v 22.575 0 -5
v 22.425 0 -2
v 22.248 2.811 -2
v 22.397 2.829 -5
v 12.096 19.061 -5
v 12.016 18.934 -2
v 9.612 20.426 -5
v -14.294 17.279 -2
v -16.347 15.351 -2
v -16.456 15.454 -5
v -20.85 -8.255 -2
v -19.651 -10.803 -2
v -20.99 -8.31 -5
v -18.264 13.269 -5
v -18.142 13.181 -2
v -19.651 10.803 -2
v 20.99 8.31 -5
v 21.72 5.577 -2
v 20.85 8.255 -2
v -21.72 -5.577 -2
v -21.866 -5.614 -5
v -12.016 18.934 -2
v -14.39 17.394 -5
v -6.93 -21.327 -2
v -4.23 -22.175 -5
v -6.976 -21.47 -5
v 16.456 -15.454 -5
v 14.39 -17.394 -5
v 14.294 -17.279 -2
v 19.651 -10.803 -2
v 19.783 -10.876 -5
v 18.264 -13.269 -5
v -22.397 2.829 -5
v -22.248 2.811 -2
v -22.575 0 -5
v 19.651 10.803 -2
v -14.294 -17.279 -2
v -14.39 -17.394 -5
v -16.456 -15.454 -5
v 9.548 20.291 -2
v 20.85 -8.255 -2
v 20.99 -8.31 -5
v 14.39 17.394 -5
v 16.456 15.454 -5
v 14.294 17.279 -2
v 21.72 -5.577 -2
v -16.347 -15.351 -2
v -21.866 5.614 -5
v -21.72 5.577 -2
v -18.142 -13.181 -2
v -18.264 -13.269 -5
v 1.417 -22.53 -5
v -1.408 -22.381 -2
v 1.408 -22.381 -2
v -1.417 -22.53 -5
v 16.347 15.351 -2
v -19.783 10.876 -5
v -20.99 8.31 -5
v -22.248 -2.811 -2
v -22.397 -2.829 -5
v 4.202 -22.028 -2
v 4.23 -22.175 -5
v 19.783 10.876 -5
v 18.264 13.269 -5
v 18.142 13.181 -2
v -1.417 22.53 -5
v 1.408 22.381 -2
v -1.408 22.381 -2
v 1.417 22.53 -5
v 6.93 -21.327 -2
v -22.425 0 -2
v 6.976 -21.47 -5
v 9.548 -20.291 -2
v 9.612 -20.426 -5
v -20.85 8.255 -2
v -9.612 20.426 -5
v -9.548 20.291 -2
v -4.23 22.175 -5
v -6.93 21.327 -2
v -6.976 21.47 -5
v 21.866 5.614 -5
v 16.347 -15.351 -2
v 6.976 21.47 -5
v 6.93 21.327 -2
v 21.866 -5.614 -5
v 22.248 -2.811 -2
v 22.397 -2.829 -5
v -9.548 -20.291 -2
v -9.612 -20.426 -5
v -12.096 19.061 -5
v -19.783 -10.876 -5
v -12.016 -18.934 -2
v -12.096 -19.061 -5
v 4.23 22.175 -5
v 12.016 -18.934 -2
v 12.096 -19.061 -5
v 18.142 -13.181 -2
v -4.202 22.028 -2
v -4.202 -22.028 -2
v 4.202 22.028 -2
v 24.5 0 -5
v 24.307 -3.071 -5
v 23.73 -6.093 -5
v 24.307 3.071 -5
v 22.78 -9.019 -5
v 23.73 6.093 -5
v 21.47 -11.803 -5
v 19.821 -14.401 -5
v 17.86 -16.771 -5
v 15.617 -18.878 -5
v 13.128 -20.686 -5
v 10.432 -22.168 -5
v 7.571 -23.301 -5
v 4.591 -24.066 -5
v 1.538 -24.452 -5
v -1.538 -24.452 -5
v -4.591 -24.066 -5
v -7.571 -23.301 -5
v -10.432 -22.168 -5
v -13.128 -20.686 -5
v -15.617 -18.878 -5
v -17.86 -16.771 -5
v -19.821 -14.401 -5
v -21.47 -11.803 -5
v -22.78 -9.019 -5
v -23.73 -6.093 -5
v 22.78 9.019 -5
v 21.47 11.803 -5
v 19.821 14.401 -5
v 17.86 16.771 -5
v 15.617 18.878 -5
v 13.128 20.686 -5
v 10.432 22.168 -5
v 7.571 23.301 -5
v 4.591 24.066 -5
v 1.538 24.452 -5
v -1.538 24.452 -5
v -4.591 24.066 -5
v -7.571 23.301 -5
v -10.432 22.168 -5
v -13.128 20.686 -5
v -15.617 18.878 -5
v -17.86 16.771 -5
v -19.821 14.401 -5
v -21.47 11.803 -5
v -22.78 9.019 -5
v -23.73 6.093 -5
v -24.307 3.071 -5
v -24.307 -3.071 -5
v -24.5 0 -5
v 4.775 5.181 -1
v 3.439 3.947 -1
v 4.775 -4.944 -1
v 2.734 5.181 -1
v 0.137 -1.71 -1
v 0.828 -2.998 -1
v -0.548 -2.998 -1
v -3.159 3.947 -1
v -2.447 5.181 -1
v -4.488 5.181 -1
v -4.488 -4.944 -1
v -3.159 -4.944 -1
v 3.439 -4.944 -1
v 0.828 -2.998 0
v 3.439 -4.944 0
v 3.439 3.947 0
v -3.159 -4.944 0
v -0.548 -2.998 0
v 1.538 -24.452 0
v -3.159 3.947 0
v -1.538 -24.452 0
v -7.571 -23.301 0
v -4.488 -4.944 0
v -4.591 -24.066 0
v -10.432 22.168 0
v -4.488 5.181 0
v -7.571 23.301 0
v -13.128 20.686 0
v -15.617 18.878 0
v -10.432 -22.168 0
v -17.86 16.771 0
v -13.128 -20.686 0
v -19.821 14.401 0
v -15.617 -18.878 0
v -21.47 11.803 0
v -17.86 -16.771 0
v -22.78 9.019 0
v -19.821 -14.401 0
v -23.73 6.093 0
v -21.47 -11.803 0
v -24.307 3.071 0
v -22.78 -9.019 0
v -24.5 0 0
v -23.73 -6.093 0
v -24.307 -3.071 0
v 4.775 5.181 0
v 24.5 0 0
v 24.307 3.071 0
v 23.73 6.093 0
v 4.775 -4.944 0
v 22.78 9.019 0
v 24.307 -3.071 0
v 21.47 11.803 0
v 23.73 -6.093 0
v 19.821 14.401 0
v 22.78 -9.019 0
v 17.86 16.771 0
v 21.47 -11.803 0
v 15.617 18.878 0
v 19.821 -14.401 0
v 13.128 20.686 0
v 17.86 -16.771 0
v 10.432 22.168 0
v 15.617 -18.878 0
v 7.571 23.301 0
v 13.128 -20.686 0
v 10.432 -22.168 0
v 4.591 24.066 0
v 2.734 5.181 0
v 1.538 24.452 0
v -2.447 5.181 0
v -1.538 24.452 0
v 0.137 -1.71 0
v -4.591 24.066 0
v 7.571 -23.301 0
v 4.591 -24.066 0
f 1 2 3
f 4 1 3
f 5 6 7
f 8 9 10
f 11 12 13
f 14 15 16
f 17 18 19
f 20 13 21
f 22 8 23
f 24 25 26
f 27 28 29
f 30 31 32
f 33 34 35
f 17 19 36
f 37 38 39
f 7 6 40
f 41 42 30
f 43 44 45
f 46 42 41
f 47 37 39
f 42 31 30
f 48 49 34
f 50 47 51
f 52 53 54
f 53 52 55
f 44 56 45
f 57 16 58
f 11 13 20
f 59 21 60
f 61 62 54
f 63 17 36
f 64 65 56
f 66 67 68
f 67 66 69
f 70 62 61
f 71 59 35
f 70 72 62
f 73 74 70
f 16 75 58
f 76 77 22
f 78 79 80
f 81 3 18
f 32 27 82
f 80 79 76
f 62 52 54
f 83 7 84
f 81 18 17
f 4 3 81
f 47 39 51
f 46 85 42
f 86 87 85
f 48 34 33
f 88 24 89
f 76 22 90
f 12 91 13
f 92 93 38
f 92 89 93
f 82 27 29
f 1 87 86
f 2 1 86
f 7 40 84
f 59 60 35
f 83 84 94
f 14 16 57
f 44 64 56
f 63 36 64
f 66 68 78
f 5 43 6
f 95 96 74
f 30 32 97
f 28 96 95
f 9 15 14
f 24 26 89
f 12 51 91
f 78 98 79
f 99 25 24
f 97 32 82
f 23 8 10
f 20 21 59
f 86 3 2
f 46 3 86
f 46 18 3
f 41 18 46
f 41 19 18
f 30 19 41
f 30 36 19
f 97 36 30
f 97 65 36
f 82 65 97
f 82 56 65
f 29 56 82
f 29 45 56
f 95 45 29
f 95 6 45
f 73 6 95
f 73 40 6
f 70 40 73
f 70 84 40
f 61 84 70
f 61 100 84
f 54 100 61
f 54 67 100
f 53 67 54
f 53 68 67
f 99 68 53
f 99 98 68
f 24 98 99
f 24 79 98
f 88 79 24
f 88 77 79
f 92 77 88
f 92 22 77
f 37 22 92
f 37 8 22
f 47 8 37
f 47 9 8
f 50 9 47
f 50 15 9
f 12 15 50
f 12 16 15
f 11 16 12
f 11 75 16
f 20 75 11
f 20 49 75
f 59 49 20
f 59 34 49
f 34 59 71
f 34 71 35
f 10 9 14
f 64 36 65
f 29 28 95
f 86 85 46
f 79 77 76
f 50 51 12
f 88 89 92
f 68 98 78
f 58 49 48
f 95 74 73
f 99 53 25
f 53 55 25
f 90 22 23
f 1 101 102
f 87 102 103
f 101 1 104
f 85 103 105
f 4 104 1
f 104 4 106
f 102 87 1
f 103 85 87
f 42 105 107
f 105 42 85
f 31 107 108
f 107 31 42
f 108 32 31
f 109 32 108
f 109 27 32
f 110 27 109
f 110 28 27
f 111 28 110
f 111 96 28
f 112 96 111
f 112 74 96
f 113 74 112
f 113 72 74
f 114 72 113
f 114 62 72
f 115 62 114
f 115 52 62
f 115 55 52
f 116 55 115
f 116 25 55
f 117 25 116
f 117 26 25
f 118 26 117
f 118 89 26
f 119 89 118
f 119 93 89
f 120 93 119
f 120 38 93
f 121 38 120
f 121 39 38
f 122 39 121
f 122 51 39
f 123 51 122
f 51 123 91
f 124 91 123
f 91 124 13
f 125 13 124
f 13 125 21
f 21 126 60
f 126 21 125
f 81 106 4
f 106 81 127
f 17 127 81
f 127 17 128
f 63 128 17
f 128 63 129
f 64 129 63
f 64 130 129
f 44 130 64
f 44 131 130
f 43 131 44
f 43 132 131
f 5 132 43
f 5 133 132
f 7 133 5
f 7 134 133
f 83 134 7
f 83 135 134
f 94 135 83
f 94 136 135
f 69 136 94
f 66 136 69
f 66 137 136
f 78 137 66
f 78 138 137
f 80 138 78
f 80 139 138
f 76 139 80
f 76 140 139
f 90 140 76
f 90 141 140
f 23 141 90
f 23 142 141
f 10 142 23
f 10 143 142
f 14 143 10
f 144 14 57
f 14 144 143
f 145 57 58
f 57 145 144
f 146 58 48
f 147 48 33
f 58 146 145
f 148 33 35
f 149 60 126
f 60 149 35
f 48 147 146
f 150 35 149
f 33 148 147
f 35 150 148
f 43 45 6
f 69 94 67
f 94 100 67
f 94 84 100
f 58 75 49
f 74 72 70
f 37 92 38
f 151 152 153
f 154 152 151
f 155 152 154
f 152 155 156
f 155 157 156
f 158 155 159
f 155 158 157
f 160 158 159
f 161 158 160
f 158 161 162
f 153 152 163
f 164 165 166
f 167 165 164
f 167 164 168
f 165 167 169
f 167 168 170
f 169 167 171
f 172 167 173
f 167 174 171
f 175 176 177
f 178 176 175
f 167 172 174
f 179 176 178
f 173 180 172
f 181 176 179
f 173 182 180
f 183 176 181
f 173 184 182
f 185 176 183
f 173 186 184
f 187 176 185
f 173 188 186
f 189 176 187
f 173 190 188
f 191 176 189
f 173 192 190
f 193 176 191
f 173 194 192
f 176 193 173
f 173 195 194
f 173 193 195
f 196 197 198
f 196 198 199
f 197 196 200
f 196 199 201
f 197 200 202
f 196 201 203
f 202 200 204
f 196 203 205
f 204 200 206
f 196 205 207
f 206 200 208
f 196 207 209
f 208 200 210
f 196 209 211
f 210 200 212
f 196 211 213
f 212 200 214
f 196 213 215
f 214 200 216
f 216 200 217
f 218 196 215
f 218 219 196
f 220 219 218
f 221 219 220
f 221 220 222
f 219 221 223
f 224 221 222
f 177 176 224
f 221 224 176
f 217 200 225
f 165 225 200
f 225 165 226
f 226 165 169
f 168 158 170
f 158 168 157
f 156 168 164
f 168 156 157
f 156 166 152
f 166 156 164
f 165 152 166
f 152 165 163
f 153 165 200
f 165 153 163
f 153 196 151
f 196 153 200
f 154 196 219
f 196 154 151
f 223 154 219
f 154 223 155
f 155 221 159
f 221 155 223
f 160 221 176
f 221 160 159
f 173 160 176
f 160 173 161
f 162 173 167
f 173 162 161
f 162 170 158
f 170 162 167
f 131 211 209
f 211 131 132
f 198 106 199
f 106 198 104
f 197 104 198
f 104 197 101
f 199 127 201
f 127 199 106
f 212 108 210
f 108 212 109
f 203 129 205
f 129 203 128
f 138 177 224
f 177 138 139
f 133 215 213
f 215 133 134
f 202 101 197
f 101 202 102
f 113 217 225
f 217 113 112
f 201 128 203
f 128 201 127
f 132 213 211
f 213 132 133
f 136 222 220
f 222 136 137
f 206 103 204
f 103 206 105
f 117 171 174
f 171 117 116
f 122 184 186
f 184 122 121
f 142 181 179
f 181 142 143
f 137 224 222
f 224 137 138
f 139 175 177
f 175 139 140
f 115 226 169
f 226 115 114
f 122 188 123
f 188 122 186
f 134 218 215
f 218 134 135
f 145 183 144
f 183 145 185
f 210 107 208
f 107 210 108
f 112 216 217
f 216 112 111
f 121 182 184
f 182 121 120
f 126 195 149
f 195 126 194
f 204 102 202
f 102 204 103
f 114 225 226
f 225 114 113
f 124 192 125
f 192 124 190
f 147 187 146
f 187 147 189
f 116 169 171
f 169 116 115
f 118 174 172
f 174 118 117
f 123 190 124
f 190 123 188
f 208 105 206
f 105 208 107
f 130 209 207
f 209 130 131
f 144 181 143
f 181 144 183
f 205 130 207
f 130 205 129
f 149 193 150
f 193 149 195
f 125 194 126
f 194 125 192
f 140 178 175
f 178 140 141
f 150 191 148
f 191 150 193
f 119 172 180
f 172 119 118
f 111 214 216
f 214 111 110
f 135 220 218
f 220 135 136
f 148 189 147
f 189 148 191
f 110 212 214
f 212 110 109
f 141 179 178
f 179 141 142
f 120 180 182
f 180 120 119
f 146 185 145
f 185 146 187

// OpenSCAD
$fn = 50;


difference() {
	union() {
		translate(v = [0, 0, -5.0000000000]) {
			cylinder(h = 5, r = 24.5000000000);
		}
	}
	union() {
		#translate(v = [0, 0, -5.0000000000]) {
			cylinder(h = 3, r1 = 22.5750000000, r2 = 22.4250000000);
		}
		translate(v = [0, 0, -1]) {
			linear_extrude(height = 1) {
				text(font = "Impact", halign = "center", size = 10, text = "M", valign = "center");
			}
		}
	}
}
